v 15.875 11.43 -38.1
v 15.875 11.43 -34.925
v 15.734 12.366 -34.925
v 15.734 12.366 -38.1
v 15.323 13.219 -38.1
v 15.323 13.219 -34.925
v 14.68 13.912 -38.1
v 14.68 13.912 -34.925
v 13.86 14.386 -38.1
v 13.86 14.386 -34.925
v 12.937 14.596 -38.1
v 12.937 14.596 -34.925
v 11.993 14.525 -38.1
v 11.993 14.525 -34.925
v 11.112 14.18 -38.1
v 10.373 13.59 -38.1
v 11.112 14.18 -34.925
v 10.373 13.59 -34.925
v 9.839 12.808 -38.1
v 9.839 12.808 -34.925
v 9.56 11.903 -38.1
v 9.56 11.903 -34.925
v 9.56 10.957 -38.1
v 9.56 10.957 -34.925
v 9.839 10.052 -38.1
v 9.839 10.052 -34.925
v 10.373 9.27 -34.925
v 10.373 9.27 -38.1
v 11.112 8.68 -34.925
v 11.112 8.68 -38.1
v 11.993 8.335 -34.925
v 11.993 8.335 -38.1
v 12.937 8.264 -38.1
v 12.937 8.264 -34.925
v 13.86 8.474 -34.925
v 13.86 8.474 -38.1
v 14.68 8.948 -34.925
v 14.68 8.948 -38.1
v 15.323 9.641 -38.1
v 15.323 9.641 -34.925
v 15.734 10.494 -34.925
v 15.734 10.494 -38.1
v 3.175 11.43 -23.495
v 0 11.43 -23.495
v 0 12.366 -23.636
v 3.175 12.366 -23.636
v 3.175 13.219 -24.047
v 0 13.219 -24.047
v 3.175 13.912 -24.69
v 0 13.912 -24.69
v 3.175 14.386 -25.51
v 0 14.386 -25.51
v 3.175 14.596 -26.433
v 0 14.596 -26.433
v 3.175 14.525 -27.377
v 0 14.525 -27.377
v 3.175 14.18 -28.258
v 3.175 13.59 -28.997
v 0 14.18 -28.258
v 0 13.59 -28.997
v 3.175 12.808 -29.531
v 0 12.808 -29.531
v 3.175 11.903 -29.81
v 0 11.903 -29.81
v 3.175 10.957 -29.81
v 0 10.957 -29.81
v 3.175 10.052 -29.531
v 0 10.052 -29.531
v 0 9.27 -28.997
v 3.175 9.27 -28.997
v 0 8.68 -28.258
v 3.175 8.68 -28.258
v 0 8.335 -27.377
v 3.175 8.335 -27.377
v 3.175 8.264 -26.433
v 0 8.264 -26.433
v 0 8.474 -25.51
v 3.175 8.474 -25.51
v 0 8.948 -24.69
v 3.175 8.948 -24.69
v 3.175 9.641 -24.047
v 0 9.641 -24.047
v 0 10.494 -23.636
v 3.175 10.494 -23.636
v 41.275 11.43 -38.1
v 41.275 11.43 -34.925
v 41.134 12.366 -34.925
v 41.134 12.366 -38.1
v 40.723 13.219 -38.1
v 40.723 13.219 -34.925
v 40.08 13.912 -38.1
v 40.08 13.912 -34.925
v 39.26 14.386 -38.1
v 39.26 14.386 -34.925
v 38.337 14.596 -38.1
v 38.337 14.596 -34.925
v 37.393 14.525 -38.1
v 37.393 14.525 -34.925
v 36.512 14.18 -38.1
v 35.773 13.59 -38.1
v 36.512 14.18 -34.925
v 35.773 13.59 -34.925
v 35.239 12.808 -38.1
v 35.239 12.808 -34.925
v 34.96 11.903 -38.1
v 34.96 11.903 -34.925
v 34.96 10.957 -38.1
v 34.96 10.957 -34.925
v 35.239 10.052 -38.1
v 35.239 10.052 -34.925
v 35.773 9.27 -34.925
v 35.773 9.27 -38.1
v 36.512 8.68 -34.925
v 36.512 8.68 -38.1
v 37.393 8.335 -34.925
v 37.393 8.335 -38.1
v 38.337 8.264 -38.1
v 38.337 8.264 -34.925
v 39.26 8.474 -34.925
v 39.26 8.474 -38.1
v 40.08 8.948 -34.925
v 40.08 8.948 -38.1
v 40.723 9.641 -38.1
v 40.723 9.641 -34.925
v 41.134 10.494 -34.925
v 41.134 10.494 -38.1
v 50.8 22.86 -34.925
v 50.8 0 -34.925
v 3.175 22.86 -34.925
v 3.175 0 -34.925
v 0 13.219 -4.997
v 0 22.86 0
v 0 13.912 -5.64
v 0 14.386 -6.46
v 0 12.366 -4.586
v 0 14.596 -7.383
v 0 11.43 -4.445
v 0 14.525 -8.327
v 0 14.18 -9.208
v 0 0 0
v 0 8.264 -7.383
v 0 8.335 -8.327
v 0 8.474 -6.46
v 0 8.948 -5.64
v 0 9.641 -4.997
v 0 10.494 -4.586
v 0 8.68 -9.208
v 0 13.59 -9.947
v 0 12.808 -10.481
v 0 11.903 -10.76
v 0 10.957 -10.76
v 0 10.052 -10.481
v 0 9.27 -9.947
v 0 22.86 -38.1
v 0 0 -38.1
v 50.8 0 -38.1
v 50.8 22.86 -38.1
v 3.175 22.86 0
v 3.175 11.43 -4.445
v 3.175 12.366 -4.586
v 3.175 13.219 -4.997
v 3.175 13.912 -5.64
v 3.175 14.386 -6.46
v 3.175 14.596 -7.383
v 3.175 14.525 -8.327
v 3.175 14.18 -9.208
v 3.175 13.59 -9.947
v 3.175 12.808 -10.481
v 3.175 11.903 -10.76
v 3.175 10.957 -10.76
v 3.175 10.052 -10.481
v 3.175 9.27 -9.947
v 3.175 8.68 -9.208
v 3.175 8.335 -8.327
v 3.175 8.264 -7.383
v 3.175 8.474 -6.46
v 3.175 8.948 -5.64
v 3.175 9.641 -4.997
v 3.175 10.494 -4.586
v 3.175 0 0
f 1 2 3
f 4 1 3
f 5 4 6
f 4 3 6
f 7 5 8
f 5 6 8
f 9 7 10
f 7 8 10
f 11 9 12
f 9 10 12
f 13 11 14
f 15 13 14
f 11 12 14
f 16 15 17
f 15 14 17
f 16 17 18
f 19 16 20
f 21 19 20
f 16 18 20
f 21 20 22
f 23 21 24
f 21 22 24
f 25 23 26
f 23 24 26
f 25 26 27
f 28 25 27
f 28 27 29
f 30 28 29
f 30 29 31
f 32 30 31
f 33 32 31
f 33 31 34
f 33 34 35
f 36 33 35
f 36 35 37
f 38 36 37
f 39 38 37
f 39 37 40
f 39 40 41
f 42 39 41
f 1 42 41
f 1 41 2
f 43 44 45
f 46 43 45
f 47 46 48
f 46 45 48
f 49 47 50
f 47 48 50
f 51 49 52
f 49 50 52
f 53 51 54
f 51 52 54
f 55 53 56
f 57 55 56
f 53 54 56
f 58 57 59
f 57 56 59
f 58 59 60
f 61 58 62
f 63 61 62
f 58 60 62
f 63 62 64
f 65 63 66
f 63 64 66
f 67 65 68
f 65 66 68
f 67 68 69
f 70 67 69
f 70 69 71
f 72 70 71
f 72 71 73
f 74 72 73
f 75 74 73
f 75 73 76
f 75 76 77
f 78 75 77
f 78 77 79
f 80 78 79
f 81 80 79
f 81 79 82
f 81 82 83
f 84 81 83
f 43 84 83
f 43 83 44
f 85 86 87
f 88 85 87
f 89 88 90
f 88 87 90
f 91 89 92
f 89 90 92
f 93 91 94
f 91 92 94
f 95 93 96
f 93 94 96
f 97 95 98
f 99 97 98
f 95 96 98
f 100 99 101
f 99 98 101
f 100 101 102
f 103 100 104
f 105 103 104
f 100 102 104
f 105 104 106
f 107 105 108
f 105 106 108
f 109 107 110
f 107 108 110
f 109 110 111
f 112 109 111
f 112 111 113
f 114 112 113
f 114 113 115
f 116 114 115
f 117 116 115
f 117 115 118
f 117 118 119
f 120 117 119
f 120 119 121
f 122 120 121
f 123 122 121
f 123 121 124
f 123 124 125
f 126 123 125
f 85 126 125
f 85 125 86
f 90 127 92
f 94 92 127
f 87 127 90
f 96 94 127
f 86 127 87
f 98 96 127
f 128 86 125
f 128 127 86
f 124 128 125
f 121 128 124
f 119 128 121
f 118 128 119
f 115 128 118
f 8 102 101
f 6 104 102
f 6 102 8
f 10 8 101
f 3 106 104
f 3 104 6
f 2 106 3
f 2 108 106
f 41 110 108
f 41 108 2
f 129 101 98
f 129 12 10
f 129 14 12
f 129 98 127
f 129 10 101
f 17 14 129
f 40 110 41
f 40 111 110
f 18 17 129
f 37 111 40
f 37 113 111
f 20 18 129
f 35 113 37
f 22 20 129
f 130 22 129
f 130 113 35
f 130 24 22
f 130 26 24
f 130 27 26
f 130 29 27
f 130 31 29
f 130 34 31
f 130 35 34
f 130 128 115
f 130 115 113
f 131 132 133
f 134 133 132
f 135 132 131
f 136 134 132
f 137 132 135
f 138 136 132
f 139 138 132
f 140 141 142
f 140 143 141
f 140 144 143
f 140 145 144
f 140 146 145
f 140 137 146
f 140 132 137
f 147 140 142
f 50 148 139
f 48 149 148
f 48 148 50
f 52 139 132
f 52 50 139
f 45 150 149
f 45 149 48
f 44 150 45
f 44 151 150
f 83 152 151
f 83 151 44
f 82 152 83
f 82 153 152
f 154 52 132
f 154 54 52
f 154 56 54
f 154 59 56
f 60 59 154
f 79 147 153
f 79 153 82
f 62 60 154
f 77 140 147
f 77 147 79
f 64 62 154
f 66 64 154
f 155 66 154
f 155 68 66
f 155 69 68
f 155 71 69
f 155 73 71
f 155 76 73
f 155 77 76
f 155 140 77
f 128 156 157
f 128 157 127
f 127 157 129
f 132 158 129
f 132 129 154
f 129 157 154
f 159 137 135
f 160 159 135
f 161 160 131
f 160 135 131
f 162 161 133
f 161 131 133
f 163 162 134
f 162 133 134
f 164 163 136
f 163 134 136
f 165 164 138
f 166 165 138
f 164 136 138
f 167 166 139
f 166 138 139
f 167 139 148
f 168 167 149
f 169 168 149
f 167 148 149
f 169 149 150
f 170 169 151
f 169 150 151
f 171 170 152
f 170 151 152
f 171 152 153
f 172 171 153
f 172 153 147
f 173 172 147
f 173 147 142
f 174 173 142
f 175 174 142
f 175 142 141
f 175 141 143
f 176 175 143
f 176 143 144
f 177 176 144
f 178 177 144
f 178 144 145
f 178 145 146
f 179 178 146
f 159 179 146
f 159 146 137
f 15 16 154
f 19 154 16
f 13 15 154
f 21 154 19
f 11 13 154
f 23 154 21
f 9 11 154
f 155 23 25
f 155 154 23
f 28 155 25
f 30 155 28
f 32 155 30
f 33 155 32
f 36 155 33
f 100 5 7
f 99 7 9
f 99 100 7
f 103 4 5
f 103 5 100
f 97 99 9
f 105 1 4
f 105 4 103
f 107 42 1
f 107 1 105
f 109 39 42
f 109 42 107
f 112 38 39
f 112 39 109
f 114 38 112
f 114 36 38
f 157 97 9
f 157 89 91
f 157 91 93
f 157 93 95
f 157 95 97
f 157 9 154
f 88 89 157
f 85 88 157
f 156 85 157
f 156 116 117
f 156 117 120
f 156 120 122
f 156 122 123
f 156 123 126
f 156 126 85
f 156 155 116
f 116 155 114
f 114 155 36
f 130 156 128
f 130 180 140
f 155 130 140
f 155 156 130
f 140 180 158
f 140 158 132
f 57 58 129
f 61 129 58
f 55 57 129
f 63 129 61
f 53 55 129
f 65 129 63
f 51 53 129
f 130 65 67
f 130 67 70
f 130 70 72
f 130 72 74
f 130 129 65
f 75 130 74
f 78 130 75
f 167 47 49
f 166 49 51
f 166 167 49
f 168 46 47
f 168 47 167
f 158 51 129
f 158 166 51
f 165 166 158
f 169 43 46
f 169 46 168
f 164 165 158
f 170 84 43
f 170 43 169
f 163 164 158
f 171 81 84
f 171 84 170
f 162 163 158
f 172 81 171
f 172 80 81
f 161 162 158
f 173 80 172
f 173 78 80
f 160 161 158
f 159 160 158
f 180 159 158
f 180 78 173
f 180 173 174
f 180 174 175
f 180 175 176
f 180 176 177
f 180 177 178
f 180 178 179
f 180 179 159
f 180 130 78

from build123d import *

# Parameters (mm, degrees)
BOSS_EXTRUDE1_DEPTH         = 22.86
F_1_4_0_25_DIAMETER_HOLE1_D = 6.35
F_1_4_0_25_DIAMETER_HOLE2_D = 6.35


with BuildPart() as part:
    # Sketch1 → Boss-Extrude1 (new body)
    with BuildSketch(Plane(origin=(0, 0, 0), x_dir=(1, 0, 0), z_dir=(0, 1, 0))):
        Polygon((0, 0), (0, 38.1), (50.8, 38.1), (50.8, 34.925), (3.175, 34.925), (3.175, 0), align=None)
    extrude(amount=BOSS_EXTRUDE1_DEPTH)

    # 1/4 (0.25) Diameter Hole1 (through all)
    with Locations(Plane(origin=(3.175, 0, 0), x_dir=(0, 0, -1), z_dir=(1, 0, 0))):
        with Locations((7.62, 11.43), (26.67, 11.43)):
            Hole(F_1_4_0_25_DIAMETER_HOLE1_D / 2)

    # 1/4 (0.25) Diameter Hole2 (through all)
    with Locations(Plane(origin=(0, 0, -38.1), x_dir=(-1, 0, 0), z_dir=(0, 0, -1))):
        with Locations((-38.1, 11.43), (-12.7, 11.43)):
            Hole(F_1_4_0_25_DIAMETER_HOLE2_D / 2)


solid = part.part
